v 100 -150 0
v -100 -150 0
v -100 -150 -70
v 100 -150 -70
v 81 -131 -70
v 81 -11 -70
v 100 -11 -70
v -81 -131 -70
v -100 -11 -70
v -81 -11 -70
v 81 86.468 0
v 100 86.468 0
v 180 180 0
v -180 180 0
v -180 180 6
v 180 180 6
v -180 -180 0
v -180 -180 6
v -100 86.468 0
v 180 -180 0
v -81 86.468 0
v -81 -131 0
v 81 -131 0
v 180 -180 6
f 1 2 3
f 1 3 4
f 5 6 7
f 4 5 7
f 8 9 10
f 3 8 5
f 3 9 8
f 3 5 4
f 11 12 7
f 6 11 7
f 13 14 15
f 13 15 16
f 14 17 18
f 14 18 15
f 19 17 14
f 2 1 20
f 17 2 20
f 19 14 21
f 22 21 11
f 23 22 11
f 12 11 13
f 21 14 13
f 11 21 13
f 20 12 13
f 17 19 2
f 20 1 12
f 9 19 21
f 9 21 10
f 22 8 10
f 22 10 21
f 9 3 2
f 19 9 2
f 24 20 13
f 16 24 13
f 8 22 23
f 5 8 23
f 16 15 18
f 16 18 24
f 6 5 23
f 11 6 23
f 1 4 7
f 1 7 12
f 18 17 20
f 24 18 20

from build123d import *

# Parameters (mm, degrees)
SKETCH1_W           = 360
SKETCH1_H           = 360
BOSS_EXTRUDE1_DEPTH = 6
SKETCH2_W           = 200
SKETCH2_H           = 19
BOSS_EXTRUDE2_DEPTH = 70
BOSS_EXTRUDE3_DEPTH = 19


with BuildPart() as part:
    # Sketch1 → Boss-Extrude1 (new body)
    with BuildSketch(Plane.XY):
        Rectangle(SKETCH1_W, SKETCH1_H)
    extrude(amount=BOSS_EXTRUDE1_DEPTH)

    # Sketch2 → Boss-Extrude2 (add)
    with BuildSketch(Plane.XY):
        with Locations((0, -140.5)):
            Rectangle(SKETCH2_W, SKETCH2_H)
    extrude(amount=-BOSS_EXTRUDE2_DEPTH)

    # Sketch3 → Boss-Extrude3 (add)
    with BuildSketch(Plane(origin=(100, 0, 0), x_dir=(0, 0, -1), z_dir=(1, 0, 0))):
        Polygon((0, -131), (0, 86.467943448), (70, -11), (70, -131), align=None)
    boss_extrude3 = extrude(amount=-BOSS_EXTRUDE3_DEPTH)

    # Mirror1: Boss-Extrude3 across plane
    add(boss_extrude3.mirror(Plane(origin=(0, 0, 0), x_dir=(0, 0, 1), z_dir=(1, 0, 0))))


solid = part.part
